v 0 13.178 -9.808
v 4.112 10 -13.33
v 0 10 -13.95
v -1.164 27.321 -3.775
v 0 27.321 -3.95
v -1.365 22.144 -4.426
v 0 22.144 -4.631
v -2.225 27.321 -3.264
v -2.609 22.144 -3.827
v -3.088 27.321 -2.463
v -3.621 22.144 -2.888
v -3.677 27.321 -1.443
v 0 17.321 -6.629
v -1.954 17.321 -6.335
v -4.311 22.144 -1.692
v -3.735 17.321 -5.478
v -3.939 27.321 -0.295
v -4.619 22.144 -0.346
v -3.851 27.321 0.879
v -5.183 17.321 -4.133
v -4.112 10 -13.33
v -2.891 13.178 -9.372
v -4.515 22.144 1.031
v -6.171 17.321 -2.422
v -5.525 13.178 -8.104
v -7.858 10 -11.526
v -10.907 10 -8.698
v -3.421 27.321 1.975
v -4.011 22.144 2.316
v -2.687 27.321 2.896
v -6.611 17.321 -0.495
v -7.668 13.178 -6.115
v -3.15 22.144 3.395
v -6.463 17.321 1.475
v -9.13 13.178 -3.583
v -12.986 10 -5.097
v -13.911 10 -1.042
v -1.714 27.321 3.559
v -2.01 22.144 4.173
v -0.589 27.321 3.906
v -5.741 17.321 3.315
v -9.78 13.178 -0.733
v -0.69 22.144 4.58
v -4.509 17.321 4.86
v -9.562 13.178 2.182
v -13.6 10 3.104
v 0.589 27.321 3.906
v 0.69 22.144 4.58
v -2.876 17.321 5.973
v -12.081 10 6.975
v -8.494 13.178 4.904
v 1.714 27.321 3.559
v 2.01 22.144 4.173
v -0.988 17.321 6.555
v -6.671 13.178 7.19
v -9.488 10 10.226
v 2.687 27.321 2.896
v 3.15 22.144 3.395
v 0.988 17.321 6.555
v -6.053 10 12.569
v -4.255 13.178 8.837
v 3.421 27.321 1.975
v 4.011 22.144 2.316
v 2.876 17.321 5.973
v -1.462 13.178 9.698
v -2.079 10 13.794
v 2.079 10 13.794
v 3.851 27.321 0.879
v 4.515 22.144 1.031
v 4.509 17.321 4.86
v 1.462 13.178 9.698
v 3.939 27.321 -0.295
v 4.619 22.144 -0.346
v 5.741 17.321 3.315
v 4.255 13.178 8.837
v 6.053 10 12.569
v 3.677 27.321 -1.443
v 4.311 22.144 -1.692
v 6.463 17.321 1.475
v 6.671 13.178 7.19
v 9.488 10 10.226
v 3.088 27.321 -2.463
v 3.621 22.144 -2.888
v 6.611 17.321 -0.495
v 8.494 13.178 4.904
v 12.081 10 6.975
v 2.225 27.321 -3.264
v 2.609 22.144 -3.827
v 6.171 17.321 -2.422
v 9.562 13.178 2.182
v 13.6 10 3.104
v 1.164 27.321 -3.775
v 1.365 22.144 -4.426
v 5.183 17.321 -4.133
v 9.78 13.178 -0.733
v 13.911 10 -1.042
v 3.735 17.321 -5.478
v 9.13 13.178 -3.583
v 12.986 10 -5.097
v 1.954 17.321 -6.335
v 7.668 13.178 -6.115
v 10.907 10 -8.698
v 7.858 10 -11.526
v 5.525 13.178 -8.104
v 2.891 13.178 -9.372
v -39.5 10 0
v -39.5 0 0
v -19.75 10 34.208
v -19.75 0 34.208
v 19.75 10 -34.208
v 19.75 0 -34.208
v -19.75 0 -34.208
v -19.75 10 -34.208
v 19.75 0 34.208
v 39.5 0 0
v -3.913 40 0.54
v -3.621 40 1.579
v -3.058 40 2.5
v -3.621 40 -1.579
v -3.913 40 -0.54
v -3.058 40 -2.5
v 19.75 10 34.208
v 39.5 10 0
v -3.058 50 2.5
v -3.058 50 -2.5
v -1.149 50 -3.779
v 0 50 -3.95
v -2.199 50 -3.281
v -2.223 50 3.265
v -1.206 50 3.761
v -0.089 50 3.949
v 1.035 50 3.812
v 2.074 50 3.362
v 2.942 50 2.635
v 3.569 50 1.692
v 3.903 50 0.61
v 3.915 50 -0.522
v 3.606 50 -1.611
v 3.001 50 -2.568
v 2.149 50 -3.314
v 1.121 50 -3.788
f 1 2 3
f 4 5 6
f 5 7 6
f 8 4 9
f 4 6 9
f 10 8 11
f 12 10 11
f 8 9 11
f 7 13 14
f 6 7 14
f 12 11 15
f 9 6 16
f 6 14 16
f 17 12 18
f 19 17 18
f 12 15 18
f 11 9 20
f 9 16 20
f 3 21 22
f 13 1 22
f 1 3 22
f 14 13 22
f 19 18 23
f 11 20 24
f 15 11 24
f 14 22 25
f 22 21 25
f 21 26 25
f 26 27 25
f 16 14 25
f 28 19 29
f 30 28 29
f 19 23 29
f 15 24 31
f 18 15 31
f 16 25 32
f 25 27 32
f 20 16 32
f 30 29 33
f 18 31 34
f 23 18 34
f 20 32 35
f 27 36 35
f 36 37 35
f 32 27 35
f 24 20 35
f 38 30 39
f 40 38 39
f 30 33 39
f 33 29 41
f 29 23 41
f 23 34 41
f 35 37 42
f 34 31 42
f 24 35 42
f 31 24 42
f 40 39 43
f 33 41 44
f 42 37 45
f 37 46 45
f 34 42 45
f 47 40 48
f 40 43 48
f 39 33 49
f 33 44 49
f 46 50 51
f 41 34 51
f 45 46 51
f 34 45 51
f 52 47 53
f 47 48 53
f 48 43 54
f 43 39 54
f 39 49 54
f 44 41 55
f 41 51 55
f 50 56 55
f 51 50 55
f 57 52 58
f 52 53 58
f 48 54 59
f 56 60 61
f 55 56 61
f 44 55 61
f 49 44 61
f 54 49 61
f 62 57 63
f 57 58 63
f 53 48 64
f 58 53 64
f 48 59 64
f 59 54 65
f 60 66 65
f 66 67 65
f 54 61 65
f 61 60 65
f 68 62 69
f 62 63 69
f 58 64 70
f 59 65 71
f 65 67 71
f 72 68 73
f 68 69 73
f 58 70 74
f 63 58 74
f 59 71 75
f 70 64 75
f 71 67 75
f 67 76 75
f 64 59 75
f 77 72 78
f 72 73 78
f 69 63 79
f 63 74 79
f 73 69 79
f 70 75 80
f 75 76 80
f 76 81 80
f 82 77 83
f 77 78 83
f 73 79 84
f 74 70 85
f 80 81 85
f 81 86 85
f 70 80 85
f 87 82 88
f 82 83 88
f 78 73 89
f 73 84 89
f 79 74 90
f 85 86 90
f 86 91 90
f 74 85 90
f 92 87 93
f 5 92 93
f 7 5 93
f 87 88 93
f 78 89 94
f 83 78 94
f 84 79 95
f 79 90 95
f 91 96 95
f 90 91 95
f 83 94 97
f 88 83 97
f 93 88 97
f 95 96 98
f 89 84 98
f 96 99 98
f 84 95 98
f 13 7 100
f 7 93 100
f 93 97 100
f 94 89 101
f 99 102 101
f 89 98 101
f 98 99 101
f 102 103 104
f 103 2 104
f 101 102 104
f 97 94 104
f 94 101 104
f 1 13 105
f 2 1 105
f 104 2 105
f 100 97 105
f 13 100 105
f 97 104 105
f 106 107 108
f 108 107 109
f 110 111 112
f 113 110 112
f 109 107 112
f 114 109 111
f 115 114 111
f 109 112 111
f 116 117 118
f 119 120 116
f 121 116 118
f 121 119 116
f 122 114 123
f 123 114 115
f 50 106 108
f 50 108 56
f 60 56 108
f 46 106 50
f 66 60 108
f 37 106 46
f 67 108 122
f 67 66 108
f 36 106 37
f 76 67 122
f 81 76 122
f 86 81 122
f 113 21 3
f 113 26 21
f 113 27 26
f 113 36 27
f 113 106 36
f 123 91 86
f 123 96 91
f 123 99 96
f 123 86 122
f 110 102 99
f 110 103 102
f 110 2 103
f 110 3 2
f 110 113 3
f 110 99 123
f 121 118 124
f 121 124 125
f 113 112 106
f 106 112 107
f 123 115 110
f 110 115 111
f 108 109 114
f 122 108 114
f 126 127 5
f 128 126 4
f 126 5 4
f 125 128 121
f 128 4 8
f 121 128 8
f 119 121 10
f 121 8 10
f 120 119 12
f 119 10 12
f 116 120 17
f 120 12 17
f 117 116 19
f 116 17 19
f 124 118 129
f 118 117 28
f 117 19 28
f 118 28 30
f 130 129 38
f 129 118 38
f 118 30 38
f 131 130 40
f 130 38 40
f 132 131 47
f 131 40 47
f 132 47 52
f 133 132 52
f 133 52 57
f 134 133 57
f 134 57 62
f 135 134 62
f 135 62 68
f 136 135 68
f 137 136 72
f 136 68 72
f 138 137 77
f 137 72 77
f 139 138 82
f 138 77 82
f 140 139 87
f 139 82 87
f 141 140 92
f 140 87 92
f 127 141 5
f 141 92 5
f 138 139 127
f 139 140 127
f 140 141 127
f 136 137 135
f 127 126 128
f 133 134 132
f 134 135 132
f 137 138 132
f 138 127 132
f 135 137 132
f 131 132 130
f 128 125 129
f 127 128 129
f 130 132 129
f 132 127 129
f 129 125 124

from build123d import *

# Parameters (mm, degrees)
BOSS_EXTRUDE1_DEPTH = 10
CUT_EXTRUDE1_START  = -10
CUT_EXTRUDE1_DEPTH  = 10


with BuildPart() as part:
    # Sketch1 → Boss-Extrude1 (new body)
    with BuildSketch(Plane(origin=(0, 0, 0), x_dir=(1, 0, 0), z_dir=(0, 1, 0))):
        Polygon((-19.75, 34.208003449), (-39.5, 0), (-19.75, -34.208003449), (19.75, -34.208003449), (39.5, 0), (19.75, 34.208003449), align=None)
    extrude(amount=BOSS_EXTRUDE1_DEPTH)

    # Sketch7 → Revolve1 (revolve)
    with BuildSketch(Plane(origin=(0, 0, 0), x_dir=(0, 0, -1), z_dir=(1, 0, 0))):
        with BuildLine():
            Line((0, 10), (0, 50))
            Line((0, 50), (3.95, 50))
            Line((3.95, 50), (3.95, 27.320508076))
            ThreePointArc((3.95, 27.320508076), (6.629491924, 17.320508076), (13.95, 10))
            Line((13.95, 10), (0, 10))
        make_face()
    revolve(axis=Axis((0, 10, 0), (0, 1, 0)))

    # Sketch8 → Cut-Extrude1 (cut)
    with BuildSketch(Plane(origin=(0, 50, 0), x_dir=(1, 0, 0), z_dir=(0, 1, 0)).offset(CUT_EXTRUDE1_START)):
        with BuildLine():
            Line((-3.058185737, -2.5), (-3.058185737, 2.5))
            ThreePointArc((-3.058185737, 2.5), (-3.95, 0), (-3.058185737, -2.5))
        make_face()
    extrude(amount=CUT_EXTRUDE1_DEPTH, mode=Mode.SUBTRACT)


solid = part.part
